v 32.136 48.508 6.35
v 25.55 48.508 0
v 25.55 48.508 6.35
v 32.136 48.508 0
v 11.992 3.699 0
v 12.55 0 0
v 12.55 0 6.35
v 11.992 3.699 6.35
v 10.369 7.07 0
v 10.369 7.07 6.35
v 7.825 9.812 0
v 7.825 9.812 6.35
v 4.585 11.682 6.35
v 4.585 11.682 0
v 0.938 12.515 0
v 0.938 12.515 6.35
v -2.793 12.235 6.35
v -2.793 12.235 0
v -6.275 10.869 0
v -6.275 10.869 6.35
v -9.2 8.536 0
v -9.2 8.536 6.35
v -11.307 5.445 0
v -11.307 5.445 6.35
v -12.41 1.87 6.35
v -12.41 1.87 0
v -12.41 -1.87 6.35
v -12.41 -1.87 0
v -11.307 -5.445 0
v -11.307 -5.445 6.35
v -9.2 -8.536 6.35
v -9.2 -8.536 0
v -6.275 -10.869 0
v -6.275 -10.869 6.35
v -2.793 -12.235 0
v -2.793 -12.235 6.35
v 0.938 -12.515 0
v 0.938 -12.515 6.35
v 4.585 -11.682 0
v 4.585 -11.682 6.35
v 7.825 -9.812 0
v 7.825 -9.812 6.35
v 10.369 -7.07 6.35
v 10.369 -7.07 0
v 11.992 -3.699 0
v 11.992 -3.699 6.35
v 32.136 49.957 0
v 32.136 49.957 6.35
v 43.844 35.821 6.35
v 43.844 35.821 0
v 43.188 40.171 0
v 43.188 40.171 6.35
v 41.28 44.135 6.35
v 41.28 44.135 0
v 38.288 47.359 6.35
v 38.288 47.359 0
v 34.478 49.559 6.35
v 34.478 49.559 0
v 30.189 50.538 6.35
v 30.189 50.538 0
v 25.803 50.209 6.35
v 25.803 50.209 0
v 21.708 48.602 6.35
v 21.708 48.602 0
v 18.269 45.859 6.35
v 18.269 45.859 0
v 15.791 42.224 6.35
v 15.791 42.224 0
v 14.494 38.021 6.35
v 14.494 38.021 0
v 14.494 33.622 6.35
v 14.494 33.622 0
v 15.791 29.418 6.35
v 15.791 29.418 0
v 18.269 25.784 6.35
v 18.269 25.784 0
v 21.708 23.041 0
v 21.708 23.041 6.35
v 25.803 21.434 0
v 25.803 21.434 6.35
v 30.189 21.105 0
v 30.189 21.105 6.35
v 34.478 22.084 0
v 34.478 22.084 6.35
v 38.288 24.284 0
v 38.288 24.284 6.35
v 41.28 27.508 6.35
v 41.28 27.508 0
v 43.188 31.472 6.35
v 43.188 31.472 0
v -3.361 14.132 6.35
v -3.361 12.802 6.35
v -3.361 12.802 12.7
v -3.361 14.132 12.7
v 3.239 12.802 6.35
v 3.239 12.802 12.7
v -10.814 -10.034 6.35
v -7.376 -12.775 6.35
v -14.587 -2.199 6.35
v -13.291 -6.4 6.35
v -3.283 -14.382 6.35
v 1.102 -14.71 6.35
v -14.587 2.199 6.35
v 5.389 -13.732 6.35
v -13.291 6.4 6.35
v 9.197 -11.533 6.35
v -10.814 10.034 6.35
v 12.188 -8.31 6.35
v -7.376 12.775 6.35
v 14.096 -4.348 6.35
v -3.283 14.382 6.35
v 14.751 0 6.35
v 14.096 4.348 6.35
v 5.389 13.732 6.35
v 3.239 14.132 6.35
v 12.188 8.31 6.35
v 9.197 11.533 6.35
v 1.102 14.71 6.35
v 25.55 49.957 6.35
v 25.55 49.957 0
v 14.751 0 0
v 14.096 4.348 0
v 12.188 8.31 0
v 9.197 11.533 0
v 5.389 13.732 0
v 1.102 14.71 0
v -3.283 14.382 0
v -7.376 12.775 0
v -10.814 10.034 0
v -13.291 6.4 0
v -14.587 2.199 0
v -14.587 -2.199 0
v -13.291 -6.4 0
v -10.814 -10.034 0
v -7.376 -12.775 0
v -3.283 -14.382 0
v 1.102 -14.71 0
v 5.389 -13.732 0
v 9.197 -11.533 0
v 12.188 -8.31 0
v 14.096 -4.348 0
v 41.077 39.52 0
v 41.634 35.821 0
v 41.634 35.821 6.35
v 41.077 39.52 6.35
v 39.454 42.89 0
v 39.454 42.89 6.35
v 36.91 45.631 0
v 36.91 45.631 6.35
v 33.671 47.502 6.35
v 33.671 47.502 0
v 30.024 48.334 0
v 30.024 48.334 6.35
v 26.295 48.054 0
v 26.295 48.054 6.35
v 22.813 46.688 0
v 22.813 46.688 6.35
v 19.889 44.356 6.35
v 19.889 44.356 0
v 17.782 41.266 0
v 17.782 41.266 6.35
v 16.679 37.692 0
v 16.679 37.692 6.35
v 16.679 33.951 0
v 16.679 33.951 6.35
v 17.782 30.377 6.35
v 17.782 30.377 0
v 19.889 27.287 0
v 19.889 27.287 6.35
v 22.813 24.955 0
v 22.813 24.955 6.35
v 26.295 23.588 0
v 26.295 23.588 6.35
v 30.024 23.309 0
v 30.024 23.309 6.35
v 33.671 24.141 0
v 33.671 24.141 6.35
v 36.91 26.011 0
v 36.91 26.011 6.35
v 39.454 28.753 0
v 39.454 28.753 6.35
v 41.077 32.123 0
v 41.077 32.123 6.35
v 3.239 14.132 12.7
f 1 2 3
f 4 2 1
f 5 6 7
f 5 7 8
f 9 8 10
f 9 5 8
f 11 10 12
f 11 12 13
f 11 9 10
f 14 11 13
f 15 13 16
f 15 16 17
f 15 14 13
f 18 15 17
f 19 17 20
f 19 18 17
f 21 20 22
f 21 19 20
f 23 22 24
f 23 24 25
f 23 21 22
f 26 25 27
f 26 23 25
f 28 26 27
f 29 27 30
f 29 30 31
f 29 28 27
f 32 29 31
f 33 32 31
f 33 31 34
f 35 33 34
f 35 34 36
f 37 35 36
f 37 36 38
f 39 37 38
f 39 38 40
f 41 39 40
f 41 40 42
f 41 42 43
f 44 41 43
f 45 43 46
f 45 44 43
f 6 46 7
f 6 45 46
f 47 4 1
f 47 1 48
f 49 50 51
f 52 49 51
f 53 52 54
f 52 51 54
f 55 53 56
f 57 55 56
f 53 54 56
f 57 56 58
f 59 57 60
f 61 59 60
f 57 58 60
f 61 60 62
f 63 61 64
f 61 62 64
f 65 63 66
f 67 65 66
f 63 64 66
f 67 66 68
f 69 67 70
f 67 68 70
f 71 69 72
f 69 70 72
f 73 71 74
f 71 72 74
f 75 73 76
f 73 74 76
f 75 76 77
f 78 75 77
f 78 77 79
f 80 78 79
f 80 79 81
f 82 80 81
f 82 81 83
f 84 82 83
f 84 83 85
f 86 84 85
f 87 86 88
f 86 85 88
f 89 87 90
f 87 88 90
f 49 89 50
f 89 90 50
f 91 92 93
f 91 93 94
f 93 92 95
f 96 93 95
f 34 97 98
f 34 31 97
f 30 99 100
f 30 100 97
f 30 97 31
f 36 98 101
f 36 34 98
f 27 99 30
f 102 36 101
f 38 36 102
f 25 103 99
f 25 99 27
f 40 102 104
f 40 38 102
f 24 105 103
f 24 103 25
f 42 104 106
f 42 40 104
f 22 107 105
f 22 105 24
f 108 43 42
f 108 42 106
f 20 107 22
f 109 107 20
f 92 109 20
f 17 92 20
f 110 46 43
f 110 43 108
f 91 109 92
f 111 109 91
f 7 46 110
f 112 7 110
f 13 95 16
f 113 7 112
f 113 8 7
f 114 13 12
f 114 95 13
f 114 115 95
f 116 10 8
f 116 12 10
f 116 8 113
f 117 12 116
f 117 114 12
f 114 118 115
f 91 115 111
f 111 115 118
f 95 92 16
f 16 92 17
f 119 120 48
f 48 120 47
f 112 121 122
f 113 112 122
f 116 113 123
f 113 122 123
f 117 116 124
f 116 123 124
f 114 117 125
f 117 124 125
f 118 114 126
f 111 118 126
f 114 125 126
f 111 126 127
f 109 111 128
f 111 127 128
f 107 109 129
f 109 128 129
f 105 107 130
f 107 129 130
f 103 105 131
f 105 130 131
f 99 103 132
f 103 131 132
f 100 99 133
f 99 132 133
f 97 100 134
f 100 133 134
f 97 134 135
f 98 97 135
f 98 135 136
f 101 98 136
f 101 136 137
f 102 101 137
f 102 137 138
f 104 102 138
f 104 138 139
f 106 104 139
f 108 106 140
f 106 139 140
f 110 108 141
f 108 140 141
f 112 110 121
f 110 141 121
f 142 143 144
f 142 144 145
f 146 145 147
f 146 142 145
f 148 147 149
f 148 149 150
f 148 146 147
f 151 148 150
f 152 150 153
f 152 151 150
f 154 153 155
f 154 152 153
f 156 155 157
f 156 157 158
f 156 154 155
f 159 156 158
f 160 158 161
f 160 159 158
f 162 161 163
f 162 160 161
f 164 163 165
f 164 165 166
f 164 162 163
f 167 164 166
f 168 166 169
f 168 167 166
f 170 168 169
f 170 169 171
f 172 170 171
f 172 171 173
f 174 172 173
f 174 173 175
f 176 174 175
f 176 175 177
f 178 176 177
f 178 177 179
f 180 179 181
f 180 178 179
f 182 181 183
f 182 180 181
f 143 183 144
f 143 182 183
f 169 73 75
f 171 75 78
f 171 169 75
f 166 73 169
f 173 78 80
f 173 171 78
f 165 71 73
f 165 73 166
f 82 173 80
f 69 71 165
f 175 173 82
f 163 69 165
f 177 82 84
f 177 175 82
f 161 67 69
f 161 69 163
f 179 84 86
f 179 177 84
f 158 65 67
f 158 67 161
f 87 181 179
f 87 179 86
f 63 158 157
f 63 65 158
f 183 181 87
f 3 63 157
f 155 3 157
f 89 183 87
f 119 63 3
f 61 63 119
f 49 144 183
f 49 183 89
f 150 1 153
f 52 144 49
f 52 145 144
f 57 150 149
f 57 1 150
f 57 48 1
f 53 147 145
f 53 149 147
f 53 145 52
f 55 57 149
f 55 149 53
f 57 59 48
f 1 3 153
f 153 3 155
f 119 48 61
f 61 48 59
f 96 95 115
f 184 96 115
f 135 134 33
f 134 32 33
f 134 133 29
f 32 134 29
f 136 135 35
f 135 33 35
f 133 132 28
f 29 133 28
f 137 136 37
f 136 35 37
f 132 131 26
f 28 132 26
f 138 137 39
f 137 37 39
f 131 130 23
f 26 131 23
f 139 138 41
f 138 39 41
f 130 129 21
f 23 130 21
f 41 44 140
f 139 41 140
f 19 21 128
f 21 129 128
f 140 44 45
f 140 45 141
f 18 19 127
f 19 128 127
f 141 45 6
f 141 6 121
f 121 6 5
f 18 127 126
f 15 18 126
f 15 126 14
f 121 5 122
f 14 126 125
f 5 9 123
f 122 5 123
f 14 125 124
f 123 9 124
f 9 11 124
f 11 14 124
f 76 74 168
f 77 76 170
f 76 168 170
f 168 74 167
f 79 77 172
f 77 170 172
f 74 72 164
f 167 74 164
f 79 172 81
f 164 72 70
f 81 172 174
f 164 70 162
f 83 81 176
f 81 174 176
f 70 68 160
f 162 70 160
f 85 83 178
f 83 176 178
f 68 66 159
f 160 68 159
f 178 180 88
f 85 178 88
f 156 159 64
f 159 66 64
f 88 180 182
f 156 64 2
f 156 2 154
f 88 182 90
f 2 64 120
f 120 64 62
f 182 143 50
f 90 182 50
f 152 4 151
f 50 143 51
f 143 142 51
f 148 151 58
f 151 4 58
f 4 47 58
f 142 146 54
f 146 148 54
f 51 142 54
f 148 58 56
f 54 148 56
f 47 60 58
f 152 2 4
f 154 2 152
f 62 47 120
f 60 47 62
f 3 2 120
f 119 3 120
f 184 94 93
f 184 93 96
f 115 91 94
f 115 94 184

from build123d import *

# Parameters (mm, degrees)
F0_R     = 14.751429
F0_R_2   = 12.549988
F0_R_3   = 14.7574
F0_R_4   = 12.5476
F0_W     = 6.585304
F0_H     = 1.449596
F1_DEPTH = 6.35
F2_W     = 6.599954
F2_H     = 1.329841
F3_DEPTH = 12.7


with BuildPart() as f1:
    # F0 (on Top) → F1 (new body)
    with BuildSketch(Plane.XY):
        Circle(F0_R)
        Circle(F0_R_2, mode=Mode.SUBTRACT)
        with Locations((29.086677, 35.821378)):
            Circle(F0_R_3)
        with Locations((29.086677, 35.821378)):
            Circle(F0_R_4, mode=Mode.SUBTRACT)
        with Locations((28.843103, 49.232328)):
            Rectangle(F0_W, F0_H, mode=Mode.SUBTRACT)
    extrude(amount=F1_DEPTH)

    # F2 (on Top) → F3 (join)
    with BuildSketch(Plane.XY):
        with Locations((-0.060716, 13.467188)):
            Rectangle(F2_W, F2_H)
    extrude(amount=F3_DEPTH)


solid = f1.part
